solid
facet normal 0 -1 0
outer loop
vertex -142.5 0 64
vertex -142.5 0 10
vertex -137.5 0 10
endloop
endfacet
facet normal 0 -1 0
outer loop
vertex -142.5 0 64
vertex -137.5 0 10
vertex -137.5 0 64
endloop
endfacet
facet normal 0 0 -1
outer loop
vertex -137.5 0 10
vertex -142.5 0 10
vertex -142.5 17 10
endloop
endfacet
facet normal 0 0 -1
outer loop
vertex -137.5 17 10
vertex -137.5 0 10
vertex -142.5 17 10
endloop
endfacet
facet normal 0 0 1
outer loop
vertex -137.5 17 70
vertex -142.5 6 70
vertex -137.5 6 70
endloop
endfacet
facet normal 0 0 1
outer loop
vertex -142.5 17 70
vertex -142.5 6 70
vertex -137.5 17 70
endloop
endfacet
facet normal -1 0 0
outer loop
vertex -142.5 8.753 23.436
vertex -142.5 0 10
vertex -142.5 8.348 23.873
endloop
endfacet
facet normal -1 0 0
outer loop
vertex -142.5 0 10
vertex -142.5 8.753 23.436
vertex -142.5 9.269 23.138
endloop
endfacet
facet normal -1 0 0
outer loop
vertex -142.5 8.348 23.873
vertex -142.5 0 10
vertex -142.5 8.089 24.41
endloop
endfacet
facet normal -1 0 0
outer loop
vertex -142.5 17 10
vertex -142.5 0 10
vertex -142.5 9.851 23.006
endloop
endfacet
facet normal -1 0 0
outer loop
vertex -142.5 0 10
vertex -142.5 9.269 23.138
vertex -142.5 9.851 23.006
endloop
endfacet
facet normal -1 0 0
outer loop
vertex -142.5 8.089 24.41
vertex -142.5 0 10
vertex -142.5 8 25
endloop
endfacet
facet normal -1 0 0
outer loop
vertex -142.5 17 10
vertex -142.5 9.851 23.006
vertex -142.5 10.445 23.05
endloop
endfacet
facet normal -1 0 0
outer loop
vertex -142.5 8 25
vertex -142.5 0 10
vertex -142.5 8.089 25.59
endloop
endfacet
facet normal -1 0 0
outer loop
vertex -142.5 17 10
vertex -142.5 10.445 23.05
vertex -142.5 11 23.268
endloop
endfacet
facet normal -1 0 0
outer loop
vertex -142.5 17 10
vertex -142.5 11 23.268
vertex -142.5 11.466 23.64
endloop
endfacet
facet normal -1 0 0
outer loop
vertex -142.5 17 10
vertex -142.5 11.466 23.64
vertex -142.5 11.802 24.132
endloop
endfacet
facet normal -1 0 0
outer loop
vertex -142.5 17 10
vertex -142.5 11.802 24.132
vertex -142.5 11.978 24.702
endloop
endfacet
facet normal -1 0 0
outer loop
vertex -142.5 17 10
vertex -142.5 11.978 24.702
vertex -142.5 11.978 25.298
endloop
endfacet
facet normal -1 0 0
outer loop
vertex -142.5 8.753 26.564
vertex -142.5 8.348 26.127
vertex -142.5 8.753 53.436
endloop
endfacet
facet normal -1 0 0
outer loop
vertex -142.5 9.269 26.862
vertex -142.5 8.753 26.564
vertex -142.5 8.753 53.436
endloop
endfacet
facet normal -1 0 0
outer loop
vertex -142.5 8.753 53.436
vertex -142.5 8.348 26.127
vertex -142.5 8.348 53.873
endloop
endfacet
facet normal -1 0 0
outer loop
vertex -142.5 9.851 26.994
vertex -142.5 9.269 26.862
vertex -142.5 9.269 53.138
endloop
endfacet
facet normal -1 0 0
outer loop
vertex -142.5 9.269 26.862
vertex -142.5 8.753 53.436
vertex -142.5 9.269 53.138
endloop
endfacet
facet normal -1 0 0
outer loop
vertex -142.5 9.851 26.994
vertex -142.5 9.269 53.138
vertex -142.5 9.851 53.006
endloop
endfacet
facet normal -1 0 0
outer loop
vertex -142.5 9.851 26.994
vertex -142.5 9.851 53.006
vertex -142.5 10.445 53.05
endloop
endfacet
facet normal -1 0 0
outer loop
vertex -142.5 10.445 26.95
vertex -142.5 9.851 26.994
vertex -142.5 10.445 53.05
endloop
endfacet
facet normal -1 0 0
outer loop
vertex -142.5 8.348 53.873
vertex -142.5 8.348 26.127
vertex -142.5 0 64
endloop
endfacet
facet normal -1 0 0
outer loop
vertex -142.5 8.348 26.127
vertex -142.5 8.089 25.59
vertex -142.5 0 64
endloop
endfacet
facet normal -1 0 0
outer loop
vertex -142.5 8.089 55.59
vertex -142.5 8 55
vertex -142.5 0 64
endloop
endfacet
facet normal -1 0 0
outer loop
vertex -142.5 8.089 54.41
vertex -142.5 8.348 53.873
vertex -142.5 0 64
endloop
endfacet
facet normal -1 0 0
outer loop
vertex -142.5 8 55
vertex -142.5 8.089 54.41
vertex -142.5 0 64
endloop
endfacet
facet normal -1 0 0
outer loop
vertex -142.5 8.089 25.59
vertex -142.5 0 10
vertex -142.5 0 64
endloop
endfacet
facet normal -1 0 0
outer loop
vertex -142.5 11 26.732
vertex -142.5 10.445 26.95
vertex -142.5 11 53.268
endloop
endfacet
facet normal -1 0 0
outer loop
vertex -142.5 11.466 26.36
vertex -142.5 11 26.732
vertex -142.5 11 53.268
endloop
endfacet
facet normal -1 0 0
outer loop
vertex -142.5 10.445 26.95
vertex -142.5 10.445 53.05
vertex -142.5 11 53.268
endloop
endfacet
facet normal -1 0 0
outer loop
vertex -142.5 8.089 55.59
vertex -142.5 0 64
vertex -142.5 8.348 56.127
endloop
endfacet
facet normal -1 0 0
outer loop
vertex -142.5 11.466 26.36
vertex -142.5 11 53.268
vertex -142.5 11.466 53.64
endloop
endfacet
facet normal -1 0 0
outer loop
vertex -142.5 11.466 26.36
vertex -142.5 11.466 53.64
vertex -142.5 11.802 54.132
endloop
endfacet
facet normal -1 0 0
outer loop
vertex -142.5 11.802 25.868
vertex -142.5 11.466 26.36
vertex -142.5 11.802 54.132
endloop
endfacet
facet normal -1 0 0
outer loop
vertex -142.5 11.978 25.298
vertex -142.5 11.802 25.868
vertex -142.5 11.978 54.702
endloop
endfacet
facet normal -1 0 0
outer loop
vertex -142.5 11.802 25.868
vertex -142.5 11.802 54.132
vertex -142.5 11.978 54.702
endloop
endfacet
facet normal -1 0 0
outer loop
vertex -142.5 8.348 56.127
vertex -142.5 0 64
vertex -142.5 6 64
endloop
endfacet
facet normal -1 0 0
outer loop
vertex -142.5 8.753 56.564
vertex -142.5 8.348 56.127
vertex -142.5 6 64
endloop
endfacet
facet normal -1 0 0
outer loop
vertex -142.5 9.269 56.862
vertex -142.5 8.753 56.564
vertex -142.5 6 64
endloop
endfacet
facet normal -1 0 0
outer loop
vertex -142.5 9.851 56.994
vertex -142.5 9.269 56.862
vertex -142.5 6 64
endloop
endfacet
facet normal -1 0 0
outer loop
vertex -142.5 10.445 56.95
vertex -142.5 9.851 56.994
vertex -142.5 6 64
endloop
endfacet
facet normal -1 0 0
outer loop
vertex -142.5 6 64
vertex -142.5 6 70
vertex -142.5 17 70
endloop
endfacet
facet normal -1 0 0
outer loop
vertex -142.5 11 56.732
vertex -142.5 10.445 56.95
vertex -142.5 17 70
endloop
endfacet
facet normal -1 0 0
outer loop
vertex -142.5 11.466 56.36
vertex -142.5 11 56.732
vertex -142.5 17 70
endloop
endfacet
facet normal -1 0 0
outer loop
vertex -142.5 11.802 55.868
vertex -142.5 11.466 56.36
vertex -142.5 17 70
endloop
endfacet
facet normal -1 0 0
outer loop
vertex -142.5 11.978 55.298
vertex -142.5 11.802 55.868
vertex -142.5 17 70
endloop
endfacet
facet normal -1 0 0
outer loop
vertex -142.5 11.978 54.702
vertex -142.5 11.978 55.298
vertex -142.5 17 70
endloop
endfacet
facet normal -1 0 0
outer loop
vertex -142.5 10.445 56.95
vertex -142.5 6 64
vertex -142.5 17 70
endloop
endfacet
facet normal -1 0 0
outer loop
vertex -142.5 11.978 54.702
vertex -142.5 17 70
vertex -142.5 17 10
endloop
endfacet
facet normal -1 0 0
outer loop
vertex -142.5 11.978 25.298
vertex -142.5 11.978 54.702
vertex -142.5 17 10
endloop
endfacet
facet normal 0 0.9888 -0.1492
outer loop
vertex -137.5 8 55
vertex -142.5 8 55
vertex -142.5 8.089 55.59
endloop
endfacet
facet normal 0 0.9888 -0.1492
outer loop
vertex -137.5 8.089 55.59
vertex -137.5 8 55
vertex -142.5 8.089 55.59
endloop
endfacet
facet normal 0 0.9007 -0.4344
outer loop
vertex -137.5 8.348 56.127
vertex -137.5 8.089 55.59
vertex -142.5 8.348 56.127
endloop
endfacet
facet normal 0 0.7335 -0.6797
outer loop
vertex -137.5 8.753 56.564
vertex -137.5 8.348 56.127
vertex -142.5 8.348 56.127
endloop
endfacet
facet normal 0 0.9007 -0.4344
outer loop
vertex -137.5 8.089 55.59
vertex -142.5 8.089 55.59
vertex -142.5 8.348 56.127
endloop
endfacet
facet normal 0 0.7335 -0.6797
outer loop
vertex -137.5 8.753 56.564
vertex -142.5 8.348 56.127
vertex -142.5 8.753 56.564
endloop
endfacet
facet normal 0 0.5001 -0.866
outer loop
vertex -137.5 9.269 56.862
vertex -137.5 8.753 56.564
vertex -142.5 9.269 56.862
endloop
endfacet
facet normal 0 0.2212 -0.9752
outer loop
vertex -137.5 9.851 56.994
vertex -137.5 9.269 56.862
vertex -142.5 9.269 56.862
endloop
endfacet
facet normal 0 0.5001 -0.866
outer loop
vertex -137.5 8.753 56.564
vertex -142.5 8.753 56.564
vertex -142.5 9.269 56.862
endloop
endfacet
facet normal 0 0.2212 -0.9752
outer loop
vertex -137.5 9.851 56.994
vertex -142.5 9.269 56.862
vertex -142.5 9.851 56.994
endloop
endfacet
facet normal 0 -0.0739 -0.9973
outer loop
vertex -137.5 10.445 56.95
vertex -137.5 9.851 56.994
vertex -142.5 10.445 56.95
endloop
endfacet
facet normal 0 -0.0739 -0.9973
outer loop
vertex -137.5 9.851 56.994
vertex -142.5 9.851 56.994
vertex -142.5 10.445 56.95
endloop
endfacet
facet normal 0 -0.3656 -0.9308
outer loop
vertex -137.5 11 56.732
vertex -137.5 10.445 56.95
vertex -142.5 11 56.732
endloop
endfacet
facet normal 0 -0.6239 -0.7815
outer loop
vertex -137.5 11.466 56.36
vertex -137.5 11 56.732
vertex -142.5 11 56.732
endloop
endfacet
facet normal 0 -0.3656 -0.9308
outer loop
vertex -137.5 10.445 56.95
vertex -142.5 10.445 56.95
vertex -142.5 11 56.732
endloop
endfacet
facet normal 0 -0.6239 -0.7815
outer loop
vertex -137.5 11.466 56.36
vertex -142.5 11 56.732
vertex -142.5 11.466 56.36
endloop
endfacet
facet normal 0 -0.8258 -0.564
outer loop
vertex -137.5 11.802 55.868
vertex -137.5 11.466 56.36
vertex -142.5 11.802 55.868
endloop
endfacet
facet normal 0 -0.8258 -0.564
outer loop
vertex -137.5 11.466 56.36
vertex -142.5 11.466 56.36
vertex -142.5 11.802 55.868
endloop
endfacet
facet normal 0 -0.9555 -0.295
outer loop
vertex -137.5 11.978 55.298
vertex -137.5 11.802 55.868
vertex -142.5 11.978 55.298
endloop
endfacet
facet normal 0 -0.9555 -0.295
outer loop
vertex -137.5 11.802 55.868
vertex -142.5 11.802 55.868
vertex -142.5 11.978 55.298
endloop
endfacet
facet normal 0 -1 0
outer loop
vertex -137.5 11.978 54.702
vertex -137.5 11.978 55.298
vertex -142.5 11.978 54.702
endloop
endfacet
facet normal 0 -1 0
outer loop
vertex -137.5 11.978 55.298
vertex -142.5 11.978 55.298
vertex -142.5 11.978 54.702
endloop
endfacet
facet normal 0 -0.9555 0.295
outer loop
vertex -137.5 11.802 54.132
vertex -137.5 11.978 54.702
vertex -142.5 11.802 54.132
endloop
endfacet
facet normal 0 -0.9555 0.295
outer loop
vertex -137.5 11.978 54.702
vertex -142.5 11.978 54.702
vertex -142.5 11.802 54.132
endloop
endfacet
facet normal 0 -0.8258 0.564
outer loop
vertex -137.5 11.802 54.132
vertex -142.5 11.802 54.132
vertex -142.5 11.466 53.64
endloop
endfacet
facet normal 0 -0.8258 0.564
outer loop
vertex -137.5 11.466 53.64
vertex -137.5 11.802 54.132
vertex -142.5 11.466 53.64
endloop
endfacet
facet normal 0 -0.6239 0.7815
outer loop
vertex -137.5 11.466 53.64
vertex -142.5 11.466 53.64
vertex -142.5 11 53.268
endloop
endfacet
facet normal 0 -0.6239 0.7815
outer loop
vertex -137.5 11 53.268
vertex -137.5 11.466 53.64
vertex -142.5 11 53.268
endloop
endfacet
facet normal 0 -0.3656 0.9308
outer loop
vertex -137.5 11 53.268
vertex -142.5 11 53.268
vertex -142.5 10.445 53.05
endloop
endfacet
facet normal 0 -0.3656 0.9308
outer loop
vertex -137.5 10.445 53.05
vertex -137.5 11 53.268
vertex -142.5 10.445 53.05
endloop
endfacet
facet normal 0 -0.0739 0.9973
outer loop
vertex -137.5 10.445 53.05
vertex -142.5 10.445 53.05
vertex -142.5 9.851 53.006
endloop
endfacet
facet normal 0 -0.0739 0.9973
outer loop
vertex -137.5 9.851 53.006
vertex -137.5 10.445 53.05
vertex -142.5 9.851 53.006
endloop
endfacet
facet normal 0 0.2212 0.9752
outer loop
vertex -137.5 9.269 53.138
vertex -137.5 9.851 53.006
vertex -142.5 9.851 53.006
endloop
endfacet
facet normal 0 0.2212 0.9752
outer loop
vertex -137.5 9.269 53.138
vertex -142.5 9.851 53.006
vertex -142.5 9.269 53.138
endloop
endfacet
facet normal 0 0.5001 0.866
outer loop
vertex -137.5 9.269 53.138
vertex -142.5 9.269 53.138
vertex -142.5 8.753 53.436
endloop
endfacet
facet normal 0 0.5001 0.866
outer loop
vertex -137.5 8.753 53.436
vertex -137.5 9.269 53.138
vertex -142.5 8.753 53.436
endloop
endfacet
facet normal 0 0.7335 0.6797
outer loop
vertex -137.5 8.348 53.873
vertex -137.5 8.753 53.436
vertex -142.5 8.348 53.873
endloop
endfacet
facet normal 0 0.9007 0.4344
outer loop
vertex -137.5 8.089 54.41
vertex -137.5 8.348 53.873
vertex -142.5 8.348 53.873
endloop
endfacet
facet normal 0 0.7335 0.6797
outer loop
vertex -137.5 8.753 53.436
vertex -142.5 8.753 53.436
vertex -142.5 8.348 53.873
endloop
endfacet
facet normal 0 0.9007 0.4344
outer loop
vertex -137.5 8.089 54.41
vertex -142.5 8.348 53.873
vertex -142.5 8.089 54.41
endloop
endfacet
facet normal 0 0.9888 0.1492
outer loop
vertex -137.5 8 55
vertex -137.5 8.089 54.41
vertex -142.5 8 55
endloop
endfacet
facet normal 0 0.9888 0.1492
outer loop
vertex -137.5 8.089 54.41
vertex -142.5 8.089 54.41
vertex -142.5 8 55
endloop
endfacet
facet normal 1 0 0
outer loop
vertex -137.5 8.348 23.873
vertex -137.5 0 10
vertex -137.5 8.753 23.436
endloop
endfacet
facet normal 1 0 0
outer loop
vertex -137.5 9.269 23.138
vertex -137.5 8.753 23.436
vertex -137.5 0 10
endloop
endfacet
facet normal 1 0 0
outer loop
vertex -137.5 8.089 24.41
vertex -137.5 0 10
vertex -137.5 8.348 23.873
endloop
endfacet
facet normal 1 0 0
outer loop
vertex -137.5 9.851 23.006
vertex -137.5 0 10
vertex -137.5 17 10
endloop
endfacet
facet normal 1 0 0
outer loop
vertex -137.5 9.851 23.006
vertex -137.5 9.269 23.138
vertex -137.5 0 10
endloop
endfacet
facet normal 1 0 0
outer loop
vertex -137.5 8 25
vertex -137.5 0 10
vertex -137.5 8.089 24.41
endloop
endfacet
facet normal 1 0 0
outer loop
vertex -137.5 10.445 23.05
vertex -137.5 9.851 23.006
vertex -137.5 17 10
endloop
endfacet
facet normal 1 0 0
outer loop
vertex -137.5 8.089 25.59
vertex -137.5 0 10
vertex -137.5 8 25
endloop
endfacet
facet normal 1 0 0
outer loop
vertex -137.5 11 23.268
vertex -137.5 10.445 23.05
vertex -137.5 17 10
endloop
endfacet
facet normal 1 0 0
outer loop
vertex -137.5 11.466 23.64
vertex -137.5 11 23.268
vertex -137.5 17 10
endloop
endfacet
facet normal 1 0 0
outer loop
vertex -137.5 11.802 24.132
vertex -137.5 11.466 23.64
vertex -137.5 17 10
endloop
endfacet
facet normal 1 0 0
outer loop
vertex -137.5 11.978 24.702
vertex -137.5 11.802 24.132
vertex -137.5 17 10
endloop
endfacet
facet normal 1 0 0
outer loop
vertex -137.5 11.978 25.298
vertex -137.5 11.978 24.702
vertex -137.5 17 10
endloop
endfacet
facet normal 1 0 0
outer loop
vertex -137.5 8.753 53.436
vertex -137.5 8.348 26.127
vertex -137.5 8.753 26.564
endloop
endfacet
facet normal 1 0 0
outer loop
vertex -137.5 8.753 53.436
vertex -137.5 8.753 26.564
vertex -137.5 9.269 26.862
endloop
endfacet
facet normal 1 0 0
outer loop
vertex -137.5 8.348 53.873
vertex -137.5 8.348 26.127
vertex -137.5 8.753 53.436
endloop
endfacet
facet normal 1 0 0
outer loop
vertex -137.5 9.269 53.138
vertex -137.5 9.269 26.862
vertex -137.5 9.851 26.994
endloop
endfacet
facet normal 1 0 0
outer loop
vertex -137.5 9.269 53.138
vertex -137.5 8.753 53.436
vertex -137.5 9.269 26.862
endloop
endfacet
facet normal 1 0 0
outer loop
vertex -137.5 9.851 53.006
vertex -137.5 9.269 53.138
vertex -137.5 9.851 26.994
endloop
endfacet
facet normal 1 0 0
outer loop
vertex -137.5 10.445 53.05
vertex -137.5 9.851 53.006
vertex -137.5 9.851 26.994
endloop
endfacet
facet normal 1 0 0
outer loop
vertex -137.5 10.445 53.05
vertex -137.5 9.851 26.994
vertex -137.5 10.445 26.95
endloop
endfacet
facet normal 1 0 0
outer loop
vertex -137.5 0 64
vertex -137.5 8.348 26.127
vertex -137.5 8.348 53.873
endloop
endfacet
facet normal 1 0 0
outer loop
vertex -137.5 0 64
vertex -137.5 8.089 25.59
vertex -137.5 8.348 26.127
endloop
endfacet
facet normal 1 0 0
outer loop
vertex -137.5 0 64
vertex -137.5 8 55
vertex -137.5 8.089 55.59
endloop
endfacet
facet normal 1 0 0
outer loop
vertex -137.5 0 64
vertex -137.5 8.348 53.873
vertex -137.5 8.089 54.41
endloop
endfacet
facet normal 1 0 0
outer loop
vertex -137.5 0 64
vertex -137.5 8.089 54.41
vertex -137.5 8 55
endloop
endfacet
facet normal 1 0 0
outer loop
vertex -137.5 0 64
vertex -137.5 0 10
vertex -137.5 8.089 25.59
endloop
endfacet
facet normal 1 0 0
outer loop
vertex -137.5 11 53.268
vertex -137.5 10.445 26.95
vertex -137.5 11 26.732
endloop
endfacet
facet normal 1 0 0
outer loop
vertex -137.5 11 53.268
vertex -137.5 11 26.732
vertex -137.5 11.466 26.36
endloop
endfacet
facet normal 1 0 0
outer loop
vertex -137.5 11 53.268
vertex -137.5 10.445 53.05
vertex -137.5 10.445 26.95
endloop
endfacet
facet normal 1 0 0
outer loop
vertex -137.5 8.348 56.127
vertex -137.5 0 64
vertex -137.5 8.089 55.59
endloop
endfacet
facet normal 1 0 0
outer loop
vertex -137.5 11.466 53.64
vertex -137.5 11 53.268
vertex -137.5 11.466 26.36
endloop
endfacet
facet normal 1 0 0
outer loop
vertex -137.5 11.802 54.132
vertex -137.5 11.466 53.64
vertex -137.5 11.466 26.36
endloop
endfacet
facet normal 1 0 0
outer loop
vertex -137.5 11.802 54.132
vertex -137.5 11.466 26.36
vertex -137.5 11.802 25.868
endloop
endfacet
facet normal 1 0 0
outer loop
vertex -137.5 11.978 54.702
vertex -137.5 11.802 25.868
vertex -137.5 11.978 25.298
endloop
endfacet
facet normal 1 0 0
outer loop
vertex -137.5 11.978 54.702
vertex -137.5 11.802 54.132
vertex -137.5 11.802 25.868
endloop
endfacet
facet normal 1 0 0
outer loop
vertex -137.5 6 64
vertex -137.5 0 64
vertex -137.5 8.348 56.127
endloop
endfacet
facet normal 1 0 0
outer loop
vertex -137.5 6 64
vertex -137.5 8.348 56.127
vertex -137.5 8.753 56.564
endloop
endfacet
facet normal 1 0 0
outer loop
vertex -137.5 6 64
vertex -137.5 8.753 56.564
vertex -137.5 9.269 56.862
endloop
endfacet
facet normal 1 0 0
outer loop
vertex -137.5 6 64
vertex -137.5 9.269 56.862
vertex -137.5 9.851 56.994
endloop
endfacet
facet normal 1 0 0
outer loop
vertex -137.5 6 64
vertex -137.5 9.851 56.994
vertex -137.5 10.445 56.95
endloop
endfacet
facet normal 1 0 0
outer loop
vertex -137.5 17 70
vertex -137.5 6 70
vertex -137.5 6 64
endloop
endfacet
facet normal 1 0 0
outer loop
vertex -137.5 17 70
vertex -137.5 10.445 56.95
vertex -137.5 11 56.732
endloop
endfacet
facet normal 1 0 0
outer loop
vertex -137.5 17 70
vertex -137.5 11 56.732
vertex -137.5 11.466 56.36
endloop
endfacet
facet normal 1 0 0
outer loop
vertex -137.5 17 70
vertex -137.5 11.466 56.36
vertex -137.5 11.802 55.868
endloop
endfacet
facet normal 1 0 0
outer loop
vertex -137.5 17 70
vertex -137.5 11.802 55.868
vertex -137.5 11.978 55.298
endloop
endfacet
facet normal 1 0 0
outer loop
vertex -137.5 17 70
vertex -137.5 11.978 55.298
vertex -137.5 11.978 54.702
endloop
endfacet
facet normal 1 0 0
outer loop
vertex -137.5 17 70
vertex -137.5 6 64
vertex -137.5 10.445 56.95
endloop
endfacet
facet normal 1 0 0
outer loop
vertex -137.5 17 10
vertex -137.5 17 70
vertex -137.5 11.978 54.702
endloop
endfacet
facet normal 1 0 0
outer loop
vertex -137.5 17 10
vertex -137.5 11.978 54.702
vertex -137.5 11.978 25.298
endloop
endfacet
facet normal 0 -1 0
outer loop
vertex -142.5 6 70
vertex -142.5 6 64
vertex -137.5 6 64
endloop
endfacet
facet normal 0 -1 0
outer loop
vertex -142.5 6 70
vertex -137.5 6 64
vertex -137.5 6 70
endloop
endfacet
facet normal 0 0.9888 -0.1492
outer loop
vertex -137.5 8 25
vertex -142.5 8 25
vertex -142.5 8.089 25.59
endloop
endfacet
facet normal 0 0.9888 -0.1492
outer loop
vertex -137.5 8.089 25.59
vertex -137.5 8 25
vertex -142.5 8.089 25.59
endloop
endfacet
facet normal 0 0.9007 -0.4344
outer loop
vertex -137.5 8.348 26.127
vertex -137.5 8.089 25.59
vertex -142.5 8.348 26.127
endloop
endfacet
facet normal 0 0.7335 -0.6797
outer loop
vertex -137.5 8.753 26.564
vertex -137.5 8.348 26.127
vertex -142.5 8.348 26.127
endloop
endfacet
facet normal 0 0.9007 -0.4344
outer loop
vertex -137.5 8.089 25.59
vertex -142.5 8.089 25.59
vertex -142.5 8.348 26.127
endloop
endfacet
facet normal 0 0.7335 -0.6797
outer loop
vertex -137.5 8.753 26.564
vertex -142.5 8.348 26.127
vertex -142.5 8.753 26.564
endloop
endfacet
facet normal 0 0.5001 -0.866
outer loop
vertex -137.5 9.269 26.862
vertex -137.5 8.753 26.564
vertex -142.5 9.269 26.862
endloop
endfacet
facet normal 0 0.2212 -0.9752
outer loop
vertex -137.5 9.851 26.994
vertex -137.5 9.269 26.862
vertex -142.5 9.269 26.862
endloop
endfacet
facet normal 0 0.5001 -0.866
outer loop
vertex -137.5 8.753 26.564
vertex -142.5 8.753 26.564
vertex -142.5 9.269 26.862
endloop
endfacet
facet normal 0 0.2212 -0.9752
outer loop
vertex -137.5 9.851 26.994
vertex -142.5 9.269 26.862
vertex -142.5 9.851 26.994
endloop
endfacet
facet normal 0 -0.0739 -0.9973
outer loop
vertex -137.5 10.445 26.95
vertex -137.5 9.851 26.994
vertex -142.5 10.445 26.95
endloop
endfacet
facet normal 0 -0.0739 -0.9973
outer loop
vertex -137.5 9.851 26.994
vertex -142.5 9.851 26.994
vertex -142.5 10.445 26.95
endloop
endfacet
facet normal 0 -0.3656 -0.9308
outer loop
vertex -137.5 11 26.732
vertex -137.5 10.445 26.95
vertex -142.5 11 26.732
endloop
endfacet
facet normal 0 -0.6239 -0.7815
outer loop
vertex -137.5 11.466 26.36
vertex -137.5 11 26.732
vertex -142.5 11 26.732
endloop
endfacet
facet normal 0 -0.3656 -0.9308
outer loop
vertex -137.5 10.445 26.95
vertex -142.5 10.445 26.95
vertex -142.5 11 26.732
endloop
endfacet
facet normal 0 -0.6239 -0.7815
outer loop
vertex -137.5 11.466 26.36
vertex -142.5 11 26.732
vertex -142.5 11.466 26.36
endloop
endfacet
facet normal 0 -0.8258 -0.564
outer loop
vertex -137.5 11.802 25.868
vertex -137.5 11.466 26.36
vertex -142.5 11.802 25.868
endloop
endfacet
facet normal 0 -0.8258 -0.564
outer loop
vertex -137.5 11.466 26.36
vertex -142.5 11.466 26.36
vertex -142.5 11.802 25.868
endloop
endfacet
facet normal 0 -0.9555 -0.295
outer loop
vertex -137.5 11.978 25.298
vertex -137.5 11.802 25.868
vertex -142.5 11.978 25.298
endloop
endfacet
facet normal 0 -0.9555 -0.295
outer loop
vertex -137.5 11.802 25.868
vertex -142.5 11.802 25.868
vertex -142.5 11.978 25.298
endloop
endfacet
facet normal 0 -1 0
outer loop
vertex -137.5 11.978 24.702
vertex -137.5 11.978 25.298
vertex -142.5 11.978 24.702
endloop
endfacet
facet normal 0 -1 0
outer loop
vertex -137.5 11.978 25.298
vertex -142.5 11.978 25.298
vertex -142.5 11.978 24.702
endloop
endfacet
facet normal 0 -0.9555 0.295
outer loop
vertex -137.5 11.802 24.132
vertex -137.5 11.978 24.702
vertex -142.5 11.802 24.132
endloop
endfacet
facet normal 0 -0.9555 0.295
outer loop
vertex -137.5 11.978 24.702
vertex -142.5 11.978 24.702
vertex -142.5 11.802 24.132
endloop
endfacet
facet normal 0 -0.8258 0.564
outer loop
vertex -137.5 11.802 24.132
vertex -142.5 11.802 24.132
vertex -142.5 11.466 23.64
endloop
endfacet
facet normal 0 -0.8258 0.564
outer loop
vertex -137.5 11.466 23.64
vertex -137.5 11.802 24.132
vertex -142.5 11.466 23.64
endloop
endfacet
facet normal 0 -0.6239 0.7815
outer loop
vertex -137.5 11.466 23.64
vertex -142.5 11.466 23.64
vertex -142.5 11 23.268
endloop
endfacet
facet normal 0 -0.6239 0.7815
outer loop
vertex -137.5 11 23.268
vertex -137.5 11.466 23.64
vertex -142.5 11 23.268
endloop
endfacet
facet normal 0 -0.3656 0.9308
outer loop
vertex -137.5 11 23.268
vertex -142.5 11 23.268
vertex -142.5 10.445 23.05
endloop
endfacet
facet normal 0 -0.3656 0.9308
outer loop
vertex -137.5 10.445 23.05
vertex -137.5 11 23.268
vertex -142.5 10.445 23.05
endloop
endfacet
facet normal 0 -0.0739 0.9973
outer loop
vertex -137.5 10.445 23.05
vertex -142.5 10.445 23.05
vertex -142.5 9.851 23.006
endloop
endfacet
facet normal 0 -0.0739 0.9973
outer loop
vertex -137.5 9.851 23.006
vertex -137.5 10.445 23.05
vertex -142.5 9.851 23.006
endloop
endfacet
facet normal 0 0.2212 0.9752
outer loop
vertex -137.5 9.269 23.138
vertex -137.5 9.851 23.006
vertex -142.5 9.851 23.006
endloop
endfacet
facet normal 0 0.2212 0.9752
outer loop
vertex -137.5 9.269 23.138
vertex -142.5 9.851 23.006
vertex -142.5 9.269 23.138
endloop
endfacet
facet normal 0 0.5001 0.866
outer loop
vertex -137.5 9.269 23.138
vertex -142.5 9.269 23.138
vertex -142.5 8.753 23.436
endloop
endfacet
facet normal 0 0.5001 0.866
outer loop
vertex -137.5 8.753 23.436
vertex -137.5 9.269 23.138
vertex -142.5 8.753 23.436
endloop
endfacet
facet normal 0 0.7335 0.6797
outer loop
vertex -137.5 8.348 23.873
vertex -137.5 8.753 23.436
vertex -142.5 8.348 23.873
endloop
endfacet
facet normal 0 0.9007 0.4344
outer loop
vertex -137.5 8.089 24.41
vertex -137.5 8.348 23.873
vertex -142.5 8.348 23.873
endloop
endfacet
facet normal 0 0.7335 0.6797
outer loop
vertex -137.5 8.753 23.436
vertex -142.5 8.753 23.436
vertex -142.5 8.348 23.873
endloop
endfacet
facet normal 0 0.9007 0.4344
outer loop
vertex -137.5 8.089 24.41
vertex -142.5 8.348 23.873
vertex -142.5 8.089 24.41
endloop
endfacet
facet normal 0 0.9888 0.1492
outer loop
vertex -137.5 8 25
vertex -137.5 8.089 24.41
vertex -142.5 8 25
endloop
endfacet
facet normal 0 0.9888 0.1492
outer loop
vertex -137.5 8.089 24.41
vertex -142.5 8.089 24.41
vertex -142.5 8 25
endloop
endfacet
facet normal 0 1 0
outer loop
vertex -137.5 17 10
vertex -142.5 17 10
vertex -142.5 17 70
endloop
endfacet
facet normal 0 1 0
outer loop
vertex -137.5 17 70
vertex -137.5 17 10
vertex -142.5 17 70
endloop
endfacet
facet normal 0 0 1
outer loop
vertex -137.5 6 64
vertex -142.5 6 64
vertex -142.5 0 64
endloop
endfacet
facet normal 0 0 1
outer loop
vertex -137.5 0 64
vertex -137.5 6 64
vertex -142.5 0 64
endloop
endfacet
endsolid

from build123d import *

# Parameters (mm, degrees)
CIRCLE004_R      = 2
EXTRUDE090_DEPTH = 5
CIRCLE006_R      = 2
EXTRUDE091_DEPTH = 5
RECTANGLE063_W   = 6
RECTANGLE063_H   = 6
EXTRUDE077_DEPTH = 7.5
RECTANGLE003_W   = 17
RECTANGLE003_H   = 60
EXTRUDE002_DEPTH = 5


with BuildPart() as extrude090:
    # Circle004 → Extrude090 (new body)
    with BuildSketch(Plane(origin=(-140, 10, 55), x_dir=(0, -1, 0), z_dir=(-1, 0, 0))):
        Circle(CIRCLE004_R)
    extrude(amount=-EXTRUDE090_DEPTH)


with BuildPart() as extrude091:
    # Circle006 → Extrude091 (new body)
    with BuildSketch(Plane(origin=(-140, 10, 25), x_dir=(0, -1, 0), z_dir=(-1, 0, 0))):
        Circle(CIRCLE006_R)
    extrude(amount=-EXTRUDE091_DEPTH)


with BuildPart() as extrude077:
    # Rectangle063 → Extrude077 (new body)
    with BuildSketch(Plane(origin=(-250, 6, 64), x_dir=(0, -1, 0), z_dir=(-1, 0, 0))):
        with Locations((3, 3)):
            Rectangle(RECTANGLE063_W, RECTANGLE063_H)
    extrude(amount=-EXTRUDE077_DEPTH)


with BuildPart() as extrude077_1:
    # Extrude077 placement: moved
    add(extrude077.part.moved(Location((110, 0, 0))))


with BuildPart() as cut009:
    # Rectangle003 → Extrude002 (new body)
    with BuildSketch(Plane(origin=(0, 0, 10), x_dir=(0, 1, 0), z_dir=(1, 0, 0))):
        with Locations((8.5, 30)):
            Rectangle(RECTANGLE003_W, RECTANGLE003_H)
    extrude(amount=EXTRUDE002_DEPTH)


with BuildPart() as cut009_1:
    # Extrude002 placement: moved
    add(cut009.part.moved(Location((-140, 0, 0))))

    # Cut: cut Extrude077
    add(extrude077_1.part, mode=Mode.SUBTRACT)

    # Cut008: cut Extrude091
    add(extrude091.part, mode=Mode.SUBTRACT)

    # Cut009: cut Extrude090
    add(extrude090.part, mode=Mode.SUBTRACT)


with BuildPart() as cut009_2:
    # Cut009 placement: moved
    add(cut009_1.part.moved(Location((-2.5, 0, 0))))


solid = cut009_2.part
